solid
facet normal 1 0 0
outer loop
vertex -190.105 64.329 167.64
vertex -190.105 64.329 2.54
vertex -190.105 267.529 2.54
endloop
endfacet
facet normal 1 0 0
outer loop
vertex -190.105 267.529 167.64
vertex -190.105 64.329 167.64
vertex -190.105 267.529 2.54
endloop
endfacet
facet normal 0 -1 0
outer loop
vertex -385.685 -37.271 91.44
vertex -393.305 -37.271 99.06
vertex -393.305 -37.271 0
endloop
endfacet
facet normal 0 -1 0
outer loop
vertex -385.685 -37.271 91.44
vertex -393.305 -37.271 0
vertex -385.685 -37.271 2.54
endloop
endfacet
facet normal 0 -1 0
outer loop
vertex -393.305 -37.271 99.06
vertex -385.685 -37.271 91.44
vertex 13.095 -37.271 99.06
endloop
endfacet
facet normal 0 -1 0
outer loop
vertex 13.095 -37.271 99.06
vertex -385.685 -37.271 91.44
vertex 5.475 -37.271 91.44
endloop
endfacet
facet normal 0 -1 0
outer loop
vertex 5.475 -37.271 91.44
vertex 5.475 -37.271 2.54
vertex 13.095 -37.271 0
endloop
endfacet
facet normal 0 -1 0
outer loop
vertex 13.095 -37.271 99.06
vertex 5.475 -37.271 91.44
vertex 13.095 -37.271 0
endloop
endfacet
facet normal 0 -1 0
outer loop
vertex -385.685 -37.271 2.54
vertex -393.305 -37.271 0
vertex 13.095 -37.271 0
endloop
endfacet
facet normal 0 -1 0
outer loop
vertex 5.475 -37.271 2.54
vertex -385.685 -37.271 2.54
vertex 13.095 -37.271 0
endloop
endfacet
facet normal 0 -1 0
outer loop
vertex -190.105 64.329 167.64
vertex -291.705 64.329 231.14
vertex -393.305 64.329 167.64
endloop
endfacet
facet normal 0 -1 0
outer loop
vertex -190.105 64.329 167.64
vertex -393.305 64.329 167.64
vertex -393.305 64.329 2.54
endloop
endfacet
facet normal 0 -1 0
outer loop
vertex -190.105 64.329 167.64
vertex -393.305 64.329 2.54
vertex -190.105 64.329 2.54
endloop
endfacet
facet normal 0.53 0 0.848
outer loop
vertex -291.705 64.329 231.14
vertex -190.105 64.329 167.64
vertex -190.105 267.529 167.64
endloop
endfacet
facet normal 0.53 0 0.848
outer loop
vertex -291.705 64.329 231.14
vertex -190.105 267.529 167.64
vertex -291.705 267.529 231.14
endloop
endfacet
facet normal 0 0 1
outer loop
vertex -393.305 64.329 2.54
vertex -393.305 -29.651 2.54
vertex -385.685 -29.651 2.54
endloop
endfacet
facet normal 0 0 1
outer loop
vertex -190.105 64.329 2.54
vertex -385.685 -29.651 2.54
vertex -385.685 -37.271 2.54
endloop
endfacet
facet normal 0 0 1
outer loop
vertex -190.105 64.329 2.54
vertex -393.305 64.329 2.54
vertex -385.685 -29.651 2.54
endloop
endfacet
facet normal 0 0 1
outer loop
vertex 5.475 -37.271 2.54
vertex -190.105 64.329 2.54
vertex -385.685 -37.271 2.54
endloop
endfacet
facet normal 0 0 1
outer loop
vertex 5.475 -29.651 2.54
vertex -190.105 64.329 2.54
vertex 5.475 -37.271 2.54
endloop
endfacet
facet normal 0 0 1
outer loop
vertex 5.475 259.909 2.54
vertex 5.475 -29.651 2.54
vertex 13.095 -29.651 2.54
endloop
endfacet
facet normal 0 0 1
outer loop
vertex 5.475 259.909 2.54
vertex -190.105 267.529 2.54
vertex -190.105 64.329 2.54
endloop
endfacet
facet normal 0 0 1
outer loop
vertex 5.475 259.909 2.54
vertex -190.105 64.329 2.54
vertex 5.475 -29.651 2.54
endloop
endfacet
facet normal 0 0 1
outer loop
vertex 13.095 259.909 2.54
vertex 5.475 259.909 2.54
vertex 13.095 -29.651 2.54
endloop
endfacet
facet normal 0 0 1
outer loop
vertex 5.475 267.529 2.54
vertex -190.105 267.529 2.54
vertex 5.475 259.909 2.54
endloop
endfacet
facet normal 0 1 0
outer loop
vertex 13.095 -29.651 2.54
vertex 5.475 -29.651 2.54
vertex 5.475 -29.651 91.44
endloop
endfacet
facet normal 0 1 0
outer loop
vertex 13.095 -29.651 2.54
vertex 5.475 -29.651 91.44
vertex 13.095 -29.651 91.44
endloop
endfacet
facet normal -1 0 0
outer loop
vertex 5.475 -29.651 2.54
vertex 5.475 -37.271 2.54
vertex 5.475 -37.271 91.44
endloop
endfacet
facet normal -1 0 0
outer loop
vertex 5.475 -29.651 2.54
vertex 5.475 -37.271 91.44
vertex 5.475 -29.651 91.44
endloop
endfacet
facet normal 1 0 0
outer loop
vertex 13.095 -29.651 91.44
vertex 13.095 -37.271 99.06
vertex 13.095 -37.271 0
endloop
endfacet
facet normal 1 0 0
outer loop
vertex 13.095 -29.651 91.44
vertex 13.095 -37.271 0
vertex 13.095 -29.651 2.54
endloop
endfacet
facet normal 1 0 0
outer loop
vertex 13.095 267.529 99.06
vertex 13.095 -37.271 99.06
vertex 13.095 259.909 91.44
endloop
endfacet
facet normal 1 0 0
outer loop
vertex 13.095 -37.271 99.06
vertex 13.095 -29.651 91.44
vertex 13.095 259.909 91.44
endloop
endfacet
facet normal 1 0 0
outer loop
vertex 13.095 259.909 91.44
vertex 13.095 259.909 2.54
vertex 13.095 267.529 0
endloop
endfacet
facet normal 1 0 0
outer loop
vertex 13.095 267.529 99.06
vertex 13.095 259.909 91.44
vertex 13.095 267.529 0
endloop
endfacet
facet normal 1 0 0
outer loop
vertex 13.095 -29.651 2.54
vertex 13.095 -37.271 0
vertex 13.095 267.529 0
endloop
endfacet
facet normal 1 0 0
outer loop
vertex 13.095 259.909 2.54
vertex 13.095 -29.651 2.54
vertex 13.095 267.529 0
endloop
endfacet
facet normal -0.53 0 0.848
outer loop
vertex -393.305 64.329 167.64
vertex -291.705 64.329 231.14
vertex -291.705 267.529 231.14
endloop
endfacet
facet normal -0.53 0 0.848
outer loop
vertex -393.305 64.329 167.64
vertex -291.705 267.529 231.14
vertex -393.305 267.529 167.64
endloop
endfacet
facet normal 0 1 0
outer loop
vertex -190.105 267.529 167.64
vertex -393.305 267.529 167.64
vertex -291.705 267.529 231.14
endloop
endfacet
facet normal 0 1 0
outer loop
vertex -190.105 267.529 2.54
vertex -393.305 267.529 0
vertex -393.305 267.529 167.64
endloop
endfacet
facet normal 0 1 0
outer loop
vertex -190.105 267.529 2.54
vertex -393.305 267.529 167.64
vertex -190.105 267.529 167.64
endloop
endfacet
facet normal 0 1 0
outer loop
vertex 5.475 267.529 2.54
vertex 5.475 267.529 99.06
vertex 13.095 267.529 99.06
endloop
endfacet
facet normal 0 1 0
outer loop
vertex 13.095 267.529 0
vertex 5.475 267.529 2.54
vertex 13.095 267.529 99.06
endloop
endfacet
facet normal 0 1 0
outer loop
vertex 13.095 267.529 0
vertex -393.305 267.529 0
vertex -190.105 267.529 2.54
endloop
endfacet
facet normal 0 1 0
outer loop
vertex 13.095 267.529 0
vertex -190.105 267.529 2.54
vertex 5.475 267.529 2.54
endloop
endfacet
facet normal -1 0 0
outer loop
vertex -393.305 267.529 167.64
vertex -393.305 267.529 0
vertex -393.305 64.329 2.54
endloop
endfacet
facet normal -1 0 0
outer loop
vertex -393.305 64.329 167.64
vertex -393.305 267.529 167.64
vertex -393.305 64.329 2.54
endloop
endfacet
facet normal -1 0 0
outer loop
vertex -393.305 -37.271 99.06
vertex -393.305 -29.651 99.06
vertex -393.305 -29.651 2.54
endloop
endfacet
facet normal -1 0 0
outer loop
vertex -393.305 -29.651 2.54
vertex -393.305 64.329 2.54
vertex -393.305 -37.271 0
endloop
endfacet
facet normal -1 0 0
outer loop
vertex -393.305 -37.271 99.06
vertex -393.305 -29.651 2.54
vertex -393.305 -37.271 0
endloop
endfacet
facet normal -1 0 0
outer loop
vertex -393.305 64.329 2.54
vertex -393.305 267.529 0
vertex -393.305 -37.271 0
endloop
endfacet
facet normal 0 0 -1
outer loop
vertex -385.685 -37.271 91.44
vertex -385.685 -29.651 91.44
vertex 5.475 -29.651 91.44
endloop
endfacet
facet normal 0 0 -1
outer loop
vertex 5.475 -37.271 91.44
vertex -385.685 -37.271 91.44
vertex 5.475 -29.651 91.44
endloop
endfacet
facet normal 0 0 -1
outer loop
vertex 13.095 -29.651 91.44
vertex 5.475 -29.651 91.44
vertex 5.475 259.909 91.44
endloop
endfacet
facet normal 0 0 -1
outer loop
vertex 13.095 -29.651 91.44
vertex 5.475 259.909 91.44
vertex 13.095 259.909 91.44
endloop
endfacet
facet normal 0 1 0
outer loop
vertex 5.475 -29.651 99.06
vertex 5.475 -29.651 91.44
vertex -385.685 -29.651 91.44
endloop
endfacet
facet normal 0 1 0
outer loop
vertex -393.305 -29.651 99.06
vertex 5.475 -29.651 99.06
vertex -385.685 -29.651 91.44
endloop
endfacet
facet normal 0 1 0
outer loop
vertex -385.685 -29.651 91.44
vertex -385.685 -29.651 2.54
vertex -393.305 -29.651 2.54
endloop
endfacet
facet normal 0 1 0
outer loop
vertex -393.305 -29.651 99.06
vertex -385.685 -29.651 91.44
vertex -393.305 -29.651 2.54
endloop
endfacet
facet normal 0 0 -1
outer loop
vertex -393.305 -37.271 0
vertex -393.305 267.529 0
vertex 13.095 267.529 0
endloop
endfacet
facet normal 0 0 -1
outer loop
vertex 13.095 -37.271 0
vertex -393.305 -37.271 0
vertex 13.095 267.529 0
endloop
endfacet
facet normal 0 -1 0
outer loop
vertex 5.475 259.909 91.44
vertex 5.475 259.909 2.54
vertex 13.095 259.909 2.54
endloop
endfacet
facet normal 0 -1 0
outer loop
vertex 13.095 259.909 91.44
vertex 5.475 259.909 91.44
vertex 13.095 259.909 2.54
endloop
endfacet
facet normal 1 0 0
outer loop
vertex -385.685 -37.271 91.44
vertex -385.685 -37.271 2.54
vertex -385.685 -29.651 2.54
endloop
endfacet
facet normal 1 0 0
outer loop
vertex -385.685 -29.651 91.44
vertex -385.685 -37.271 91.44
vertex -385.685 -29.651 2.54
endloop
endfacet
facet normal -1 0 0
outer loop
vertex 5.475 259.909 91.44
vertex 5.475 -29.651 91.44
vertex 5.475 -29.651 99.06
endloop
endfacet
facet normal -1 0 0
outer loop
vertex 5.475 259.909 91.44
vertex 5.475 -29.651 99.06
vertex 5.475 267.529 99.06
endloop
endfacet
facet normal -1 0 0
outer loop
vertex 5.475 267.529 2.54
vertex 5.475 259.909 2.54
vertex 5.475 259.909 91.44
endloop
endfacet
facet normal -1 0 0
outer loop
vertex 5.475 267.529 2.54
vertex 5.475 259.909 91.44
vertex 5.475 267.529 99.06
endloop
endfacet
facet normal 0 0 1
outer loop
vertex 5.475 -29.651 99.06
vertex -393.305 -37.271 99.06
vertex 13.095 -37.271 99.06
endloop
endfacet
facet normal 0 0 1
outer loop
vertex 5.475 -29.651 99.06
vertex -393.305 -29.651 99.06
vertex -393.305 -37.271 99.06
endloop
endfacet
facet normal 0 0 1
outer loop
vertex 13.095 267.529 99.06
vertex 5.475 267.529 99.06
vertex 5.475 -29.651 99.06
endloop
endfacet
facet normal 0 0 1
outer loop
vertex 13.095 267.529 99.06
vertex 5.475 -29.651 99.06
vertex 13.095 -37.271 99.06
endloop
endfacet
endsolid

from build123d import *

# Parameters (mm, degrees)
F0_W     = 406.4
F0_H     = 304.8
F1_DEPTH = 2.54
F2_W     = 7.62
F2_H     = 7.62
F3_DEPTH = 88.9
F4_W     = 203.2
F4_H     = 203.2
F5_DEPTH = 165.1
F7_DEPTH = 203.2
F8_W     = 7.62
F8_H     = 297.18
F9_DEPTH = 7.62


with BuildPart() as f1:
    # F0 (on Top) → F1 (new body)
    with BuildSketch(Plane.XY):
        with Locations((-190.104838, 115.129152)):
            Rectangle(F0_W, F0_H)
    extrude(amount=F1_DEPTH)

    # F2 (on face) → F3 (join)
    with BuildSketch(Plane.XY.offset(2.54)):
        with Locations((-389.494838, -33.460848)):
            Rectangle(F2_W, F2_H)
        with Locations((9.285162, -33.460848)):
            Rectangle(F2_W, F2_H)
        with Locations((9.285162, 263.719152)):
            Rectangle(F2_W, F2_H)
    extrude(amount=F3_DEPTH)

    # F4 (on face) → F5 (join)
    with BuildSketch(Plane.XY.offset(2.54)):
        with Locations((-291.704838, 165.929152)):
            Rectangle(F4_W, F4_H)
    extrude(amount=F5_DEPTH)

    # F6 (on face) → F7 (join)
    with BuildSketch(Plane.XZ.offset(-64.329152)):
        Polygon((-291.704838, 231.14), (-393.304838, 167.64), (-291.704838, 167.64), align=None)
        Polygon((-291.704838, 231.14), (-291.704838, 167.64), (-190.104838, 167.64), align=None)
    extrude(amount=-F7_DEPTH)

    # F8 (on face) → F9 (join)
    with BuildSketch(Plane.XY.offset(91.44)):
        Polygon((-393.304838, -37.270848), (13.095162, -37.270848), (13.095162, -29.650848), (5.475162, -29.650848), (-393.304838, -29.650848), align=None)
        with Locations((9.285162, 118.939152)):
            Rectangle(F8_W, F8_H)
    extrude(amount=F9_DEPTH)


solid = f1.part
